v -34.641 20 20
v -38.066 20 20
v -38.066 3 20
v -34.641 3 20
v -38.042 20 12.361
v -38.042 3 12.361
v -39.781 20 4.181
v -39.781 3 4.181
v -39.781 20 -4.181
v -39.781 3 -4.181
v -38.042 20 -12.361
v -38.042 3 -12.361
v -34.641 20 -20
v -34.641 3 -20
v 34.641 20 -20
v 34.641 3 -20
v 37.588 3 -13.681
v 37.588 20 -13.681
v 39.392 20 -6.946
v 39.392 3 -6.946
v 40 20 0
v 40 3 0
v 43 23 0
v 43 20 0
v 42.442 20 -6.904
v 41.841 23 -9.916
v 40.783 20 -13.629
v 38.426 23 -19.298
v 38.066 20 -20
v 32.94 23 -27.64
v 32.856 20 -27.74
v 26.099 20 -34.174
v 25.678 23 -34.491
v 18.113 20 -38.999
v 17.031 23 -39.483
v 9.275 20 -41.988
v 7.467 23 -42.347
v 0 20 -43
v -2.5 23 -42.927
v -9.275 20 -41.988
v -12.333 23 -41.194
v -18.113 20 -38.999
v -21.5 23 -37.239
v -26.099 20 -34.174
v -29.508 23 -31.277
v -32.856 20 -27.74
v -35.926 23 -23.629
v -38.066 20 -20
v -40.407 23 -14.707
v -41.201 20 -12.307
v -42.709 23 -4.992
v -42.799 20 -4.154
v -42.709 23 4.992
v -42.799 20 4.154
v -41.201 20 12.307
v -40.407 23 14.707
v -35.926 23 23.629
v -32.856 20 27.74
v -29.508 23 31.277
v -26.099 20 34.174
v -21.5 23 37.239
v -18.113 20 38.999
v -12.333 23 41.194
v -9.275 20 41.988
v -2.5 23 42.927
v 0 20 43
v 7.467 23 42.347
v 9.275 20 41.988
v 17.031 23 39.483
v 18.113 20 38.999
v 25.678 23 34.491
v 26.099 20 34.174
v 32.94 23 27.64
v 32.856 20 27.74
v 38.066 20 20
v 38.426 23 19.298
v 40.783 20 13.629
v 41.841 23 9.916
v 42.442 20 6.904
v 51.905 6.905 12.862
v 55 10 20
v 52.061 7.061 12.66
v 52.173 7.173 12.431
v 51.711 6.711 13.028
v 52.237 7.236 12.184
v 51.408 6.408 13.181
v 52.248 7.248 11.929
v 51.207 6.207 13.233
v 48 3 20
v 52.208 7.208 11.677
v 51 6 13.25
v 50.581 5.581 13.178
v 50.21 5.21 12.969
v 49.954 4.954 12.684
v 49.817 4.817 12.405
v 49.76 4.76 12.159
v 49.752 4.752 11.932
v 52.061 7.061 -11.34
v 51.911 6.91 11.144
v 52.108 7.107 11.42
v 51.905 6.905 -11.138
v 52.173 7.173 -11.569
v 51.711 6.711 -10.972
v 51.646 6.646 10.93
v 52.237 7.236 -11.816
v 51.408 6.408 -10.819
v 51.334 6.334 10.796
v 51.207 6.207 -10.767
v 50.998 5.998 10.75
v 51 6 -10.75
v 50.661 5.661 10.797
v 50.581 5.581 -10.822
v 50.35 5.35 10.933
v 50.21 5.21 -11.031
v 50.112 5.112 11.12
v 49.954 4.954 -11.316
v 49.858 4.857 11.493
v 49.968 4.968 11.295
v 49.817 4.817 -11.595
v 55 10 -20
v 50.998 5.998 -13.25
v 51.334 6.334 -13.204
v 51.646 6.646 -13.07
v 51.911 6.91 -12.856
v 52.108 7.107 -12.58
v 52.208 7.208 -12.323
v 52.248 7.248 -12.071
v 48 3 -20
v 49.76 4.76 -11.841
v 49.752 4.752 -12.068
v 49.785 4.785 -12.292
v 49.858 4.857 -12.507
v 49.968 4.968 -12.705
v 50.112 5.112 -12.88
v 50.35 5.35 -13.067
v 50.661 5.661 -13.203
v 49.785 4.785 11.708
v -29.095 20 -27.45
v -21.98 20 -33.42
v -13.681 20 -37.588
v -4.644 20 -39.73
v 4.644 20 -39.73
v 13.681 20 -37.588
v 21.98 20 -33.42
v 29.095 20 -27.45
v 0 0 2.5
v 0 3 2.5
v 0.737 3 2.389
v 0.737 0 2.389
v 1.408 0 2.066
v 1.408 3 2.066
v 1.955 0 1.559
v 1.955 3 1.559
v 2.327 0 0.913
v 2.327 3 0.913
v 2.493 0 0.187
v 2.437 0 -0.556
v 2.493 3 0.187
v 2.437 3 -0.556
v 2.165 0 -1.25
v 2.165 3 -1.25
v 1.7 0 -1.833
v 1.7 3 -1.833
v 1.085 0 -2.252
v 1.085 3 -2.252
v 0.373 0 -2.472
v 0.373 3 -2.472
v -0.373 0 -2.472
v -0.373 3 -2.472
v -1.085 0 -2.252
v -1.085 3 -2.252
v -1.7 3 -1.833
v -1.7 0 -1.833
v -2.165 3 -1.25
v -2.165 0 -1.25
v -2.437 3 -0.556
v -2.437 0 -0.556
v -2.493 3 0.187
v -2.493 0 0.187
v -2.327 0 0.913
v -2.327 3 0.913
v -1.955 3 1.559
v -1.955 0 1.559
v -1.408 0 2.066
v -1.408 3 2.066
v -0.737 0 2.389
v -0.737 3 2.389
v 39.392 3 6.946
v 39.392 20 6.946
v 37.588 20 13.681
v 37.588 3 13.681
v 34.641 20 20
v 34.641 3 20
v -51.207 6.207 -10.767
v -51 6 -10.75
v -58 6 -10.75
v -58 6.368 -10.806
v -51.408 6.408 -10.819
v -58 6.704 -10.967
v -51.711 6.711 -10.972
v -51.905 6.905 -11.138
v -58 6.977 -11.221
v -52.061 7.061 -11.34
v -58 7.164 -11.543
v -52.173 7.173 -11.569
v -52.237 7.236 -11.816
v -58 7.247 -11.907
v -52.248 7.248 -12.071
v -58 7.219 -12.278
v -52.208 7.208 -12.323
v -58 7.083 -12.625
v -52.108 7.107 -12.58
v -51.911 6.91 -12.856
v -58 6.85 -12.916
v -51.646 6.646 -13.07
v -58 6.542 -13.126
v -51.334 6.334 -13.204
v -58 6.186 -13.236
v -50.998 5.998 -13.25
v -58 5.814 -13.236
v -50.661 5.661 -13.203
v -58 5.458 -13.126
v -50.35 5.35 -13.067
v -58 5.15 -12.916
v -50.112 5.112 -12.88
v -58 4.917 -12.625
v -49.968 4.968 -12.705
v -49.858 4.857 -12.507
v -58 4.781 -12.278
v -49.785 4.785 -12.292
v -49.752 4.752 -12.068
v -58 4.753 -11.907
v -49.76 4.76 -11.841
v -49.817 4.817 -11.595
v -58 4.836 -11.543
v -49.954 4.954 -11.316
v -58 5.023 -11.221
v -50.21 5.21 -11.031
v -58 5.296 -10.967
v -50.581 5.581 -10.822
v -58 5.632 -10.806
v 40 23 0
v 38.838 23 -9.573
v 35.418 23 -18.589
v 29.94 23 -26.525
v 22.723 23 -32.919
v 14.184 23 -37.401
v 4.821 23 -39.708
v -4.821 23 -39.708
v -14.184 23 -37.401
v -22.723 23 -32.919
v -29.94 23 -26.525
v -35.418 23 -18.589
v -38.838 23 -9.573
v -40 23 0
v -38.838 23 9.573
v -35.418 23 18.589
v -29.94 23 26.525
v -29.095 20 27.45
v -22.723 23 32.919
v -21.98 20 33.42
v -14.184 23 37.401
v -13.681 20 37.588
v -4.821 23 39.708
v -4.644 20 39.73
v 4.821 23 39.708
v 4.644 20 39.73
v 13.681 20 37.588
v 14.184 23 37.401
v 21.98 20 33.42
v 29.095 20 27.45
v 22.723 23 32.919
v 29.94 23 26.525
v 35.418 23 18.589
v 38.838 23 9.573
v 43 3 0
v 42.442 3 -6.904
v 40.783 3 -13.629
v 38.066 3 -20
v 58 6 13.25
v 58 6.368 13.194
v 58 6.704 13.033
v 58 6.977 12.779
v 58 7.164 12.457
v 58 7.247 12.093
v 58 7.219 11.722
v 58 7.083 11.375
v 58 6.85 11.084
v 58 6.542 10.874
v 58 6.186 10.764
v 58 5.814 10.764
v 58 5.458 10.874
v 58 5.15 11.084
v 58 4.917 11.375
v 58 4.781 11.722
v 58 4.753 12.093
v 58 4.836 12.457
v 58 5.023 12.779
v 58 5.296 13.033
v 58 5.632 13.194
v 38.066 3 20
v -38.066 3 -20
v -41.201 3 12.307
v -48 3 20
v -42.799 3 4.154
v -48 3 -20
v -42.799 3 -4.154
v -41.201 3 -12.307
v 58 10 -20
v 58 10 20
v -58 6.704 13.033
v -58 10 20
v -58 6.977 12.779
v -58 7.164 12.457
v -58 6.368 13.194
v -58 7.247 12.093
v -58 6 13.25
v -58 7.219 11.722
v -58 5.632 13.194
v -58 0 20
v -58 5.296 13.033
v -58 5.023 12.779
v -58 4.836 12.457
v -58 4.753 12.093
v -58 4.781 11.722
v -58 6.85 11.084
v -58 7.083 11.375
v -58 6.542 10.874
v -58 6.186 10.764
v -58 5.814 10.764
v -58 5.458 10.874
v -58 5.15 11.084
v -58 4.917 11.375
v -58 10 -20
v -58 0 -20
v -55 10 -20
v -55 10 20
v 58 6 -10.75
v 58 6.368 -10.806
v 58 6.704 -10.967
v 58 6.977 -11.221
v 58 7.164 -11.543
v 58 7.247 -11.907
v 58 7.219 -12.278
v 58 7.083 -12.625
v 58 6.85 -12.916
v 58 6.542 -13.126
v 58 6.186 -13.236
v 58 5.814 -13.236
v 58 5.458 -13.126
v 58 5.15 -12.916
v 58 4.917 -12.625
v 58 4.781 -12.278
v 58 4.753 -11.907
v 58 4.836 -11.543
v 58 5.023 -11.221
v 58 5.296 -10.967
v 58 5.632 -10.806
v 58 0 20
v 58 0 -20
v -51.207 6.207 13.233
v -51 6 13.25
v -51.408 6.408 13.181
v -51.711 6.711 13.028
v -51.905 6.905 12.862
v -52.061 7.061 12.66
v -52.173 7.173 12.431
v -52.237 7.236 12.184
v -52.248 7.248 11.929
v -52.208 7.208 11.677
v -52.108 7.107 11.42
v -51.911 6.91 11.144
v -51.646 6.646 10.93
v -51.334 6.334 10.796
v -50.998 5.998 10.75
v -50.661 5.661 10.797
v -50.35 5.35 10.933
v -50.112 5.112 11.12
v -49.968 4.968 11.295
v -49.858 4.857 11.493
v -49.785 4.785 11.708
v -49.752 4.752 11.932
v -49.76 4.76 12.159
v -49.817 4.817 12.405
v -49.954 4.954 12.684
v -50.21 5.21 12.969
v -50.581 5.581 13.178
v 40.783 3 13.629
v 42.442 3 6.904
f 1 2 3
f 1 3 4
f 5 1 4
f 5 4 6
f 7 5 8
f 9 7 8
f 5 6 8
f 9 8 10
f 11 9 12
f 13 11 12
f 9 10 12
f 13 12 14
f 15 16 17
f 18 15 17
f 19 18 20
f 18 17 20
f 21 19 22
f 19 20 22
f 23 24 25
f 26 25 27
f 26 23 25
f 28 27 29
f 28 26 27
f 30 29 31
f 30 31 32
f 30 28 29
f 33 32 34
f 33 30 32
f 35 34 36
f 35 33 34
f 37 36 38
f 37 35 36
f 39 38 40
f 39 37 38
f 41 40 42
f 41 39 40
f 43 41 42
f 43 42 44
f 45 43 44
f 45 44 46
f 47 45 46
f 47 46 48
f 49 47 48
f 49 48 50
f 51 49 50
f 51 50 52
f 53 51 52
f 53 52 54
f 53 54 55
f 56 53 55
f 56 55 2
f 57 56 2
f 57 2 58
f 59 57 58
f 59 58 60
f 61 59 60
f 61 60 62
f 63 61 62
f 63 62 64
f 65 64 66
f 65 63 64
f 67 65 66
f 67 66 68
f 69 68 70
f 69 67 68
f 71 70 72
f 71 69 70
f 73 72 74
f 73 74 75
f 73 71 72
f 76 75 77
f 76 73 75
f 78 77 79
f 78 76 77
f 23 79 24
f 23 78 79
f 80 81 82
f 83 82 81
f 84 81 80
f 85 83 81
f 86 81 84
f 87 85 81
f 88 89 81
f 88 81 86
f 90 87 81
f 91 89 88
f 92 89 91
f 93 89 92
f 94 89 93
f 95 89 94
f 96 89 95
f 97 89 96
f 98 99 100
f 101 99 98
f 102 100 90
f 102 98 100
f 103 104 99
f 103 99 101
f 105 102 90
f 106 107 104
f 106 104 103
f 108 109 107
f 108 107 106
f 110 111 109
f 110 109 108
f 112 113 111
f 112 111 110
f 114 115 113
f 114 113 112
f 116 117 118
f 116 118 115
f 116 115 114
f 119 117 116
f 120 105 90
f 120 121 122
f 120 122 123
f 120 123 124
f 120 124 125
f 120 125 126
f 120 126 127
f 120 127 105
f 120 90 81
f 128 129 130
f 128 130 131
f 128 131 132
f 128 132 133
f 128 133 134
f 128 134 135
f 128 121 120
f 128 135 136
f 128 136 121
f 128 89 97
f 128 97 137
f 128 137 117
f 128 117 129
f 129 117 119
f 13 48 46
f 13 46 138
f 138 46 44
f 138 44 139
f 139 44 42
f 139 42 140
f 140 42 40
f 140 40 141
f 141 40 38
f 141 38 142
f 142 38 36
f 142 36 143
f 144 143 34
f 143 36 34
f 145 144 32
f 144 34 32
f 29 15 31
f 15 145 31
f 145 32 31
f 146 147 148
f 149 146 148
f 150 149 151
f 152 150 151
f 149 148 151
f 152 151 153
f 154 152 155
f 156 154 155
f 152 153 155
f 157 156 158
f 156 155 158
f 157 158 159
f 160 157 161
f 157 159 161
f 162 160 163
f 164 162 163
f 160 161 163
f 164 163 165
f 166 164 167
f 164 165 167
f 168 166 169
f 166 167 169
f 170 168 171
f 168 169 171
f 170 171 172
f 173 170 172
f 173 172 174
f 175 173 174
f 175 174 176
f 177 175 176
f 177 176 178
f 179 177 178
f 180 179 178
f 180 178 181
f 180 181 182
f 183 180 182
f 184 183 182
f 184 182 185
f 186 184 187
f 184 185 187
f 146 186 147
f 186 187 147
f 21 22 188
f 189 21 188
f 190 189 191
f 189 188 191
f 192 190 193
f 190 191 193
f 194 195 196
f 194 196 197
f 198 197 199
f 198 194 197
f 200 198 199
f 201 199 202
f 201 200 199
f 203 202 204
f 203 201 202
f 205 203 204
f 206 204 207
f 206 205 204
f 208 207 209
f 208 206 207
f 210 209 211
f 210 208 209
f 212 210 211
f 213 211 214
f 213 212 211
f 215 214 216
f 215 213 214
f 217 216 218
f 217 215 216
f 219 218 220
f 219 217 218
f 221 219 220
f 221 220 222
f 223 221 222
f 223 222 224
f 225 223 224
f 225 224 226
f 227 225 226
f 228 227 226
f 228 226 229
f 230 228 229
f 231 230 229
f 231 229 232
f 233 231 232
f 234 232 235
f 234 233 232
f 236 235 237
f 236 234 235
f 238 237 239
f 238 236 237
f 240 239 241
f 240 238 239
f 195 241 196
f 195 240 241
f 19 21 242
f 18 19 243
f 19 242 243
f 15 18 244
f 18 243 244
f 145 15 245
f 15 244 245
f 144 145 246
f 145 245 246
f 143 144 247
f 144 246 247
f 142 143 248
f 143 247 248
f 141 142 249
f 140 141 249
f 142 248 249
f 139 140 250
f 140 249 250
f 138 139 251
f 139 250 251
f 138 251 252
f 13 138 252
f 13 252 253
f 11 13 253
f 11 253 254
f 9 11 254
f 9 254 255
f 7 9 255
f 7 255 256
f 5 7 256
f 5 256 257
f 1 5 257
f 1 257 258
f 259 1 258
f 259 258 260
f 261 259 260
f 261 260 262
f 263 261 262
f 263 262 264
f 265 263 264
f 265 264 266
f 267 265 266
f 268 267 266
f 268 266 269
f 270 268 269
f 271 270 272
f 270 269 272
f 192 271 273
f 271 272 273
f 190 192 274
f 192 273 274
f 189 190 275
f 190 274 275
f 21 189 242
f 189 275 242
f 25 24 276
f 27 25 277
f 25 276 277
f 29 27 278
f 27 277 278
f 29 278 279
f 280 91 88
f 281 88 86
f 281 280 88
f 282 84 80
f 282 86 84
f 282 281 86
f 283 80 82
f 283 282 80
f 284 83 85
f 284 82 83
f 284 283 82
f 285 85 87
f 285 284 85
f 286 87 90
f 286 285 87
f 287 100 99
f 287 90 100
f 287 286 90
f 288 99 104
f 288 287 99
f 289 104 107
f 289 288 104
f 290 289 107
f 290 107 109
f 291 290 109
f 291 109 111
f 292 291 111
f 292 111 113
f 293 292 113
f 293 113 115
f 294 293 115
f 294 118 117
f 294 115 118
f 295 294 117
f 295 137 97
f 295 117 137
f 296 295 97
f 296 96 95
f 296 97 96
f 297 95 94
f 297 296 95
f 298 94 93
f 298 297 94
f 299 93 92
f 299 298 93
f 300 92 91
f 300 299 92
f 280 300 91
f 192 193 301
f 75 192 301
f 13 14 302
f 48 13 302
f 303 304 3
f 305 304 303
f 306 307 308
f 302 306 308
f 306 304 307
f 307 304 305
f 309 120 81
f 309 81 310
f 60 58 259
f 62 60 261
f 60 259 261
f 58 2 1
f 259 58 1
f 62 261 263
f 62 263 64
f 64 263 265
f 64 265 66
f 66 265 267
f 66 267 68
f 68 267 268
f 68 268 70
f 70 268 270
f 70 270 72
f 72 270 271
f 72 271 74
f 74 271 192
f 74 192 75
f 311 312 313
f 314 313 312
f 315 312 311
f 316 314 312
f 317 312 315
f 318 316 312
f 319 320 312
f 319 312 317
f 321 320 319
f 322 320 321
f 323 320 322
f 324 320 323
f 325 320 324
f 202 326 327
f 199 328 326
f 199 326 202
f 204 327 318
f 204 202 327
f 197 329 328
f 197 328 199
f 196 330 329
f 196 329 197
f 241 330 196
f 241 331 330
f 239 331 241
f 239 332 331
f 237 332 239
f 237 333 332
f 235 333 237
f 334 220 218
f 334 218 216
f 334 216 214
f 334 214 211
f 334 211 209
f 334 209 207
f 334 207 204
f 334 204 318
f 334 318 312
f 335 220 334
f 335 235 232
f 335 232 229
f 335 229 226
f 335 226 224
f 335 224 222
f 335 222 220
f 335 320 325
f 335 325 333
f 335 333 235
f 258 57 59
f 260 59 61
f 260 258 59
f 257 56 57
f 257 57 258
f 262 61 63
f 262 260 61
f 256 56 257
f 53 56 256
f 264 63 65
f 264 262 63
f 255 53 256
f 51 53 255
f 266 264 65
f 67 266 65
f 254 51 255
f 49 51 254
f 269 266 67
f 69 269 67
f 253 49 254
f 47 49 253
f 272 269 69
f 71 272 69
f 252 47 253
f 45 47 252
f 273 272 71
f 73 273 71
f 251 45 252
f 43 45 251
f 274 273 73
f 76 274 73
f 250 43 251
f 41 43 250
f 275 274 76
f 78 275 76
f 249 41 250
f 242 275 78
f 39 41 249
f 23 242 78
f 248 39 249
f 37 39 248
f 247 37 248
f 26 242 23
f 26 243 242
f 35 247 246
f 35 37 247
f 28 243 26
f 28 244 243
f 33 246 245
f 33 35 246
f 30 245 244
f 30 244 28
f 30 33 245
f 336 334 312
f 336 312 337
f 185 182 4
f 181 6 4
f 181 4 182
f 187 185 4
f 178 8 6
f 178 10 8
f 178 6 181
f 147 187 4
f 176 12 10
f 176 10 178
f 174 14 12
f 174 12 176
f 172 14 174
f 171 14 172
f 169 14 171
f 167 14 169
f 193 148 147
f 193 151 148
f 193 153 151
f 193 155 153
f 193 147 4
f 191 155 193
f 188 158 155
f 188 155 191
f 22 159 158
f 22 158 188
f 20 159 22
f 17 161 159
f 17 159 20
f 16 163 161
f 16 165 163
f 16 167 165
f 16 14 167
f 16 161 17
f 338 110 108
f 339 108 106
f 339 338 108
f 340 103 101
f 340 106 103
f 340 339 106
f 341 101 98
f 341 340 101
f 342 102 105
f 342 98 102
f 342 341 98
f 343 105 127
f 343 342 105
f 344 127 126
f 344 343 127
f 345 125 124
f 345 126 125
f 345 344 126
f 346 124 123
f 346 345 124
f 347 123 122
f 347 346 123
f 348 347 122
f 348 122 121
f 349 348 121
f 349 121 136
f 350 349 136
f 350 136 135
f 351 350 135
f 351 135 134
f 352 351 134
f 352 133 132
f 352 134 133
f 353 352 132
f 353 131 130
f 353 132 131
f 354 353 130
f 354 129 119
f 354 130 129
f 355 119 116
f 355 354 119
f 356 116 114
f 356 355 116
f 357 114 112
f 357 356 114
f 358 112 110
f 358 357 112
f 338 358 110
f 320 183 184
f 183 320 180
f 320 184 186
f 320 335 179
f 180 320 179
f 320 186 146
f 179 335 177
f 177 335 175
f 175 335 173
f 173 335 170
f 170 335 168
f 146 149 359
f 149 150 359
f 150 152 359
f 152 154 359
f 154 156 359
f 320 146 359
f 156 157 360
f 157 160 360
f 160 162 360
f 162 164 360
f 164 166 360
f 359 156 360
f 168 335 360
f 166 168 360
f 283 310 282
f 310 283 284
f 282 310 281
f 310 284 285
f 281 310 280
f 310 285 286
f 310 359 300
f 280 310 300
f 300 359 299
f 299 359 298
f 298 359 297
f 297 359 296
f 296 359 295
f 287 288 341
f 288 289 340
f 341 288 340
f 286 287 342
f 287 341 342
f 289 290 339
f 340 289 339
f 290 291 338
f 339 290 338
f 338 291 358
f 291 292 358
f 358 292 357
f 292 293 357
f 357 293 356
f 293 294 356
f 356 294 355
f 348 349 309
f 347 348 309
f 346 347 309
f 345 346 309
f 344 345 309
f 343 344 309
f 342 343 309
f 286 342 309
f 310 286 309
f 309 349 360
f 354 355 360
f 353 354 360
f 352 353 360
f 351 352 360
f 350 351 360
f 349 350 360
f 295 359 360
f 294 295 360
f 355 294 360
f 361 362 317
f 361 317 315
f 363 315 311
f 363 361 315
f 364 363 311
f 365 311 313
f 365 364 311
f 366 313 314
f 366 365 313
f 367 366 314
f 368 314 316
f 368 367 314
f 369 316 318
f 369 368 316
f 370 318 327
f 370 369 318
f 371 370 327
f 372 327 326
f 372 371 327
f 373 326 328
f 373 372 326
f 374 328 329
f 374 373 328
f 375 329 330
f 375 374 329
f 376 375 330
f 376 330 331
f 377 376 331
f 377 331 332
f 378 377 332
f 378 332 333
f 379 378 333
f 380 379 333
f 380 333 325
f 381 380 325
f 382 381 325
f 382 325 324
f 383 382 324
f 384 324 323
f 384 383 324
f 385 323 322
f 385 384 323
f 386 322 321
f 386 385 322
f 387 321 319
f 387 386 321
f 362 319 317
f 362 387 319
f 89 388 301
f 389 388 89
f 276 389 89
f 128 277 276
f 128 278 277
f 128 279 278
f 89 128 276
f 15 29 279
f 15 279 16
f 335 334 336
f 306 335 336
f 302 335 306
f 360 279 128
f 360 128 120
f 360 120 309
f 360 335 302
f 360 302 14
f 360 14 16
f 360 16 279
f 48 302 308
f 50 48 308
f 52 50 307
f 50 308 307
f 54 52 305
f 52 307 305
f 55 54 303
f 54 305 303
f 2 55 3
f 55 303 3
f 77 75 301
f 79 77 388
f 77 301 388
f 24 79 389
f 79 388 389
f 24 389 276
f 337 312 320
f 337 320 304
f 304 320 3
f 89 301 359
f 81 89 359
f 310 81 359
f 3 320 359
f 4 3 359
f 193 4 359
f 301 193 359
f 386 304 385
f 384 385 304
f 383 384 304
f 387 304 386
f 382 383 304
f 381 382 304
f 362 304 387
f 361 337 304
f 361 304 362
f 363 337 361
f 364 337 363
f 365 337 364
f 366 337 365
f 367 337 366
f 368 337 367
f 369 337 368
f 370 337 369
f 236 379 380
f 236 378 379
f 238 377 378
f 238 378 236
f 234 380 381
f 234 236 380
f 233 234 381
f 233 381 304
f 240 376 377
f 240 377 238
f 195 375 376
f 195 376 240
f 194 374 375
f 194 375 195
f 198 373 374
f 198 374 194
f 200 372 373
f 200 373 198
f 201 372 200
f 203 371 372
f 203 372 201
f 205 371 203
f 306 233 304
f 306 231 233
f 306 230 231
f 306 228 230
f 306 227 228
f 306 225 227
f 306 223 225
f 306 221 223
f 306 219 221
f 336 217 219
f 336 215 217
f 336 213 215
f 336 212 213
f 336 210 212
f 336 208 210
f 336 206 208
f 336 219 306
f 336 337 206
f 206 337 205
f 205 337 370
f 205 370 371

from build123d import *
from build123d.topology import SkipClean

# Parameters (mm, degrees)
SKETCH_1_W               = 116
SKETCH_1_H               = 40
EXTRUDE_1_DEPTH          = 3
SKETCH_2_R               = 2.5
CUT_EXTRUDE_1_DEPTH      = 3
SKETCH_3_W               = 3
SKETCH_3_H               = 40
EXTRUDE_2_DEPTH          = 7
CHAMFER_1_SIZE           = 7
CUT_EXTRUDE_2_DEPTH      = 119.135515405
CUT_EXTRUDE_2_DEPTH_BACK = 119.135515405
SKETCH_4_R               = 1.25
SKETCH_6_R               = 43
SKETCH_6_R_2             = 40
EXTRUDE_1_2_DEPTH        = 3
EXTRUDE_3_DEPTH          = 17


with BuildPart() as part:
    # 草图1 → Extrude 1 (new body)
    with BuildSketch(Plane(origin=(0, 0, 0), x_dir=(1, 0, 0), z_dir=(0, 1, 0))):
        Rectangle(SKETCH_1_W, SKETCH_1_H)
    extrude(amount=EXTRUDE_1_DEPTH)

    # 草图2 → 切除-拉伸1 (cut)
    with BuildSketch(Plane(origin=(0, 3, 0), x_dir=(1, 0, 0), z_dir=(0, 1, 0))):
        with Locations(Location((0, 0, 0), (0, 0, 270))):
            Circle(SKETCH_2_R)
    extrude(amount=-CUT_EXTRUDE_1_DEPTH, mode=Mode.SUBTRACT)

    # 草图3 → 凸台-拉伸2 (add)
    with BuildSketch(Plane(origin=(0, 3, 0), x_dir=(1, 0, 0), z_dir=(0, 1, 0))):
        with Locations((-56.5, 0)):
            Rectangle(SKETCH_3_W, SKETCH_3_H)
        with Locations((56.5, 0)):
            Rectangle(SKETCH_3_W, SKETCH_3_H)
    extrude(amount=EXTRUDE_2_DEPTH)

    # 倒角1
    chamfer_1_edges = [part.edges().sort_by_distance(p)[0] for p in [
        (-55, 3, 0),
        (55, 3, 0),
    ]]
    chamfer(chamfer_1_edges, length=CHAMFER_1_SIZE - 0.0001)  # a hair under: the kernel refuses the full size

    # 草图4 → 切除-拉伸2 (cut, two sides: drawn at the far end of the back side and taken through both)
    with BuildSketch(Plane.ZY.offset(58).offset(-CUT_EXTRUDE_2_DEPTH_BACK)):
        with Locations((-12, 6)):
            Circle(SKETCH_4_R)
        with Locations((12, 6)):
            Circle(SKETCH_4_R)
    extrude(amount=CUT_EXTRUDE_2_DEPTH + CUT_EXTRUDE_2_DEPTH_BACK, mode=Mode.SUBTRACT)



with BuildPart() as body_2:
    # 草图6 → Extrude 1 2 (new body)
    with BuildSketch(Plane(origin=(0, 23, 0), x_dir=(1, 0, 0), z_dir=(0, 1, 0))):
        Circle(SKETCH_6_R)
        Circle(SKETCH_6_R_2, mode=Mode.SUBTRACT)
    extrude(amount=-EXTRUDE_1_2_DEPTH)


with BuildPart() as part_1:
    with SkipClean():  # the faces are left unmerged after this step: merging them gives an invalid solid
        add(part.part)

        add(body_2.part)  # 凸台-拉伸3 merges body 2
        # 草图7 → 凸台-拉伸3 (add)
        with BuildSketch(Plane(origin=(0, 3, 0), x_dir=(1, 0, 0), z_dir=(0, 1, 0))):
            with BuildLine():
                Line((-34.641016151, 20), (-38.065732621, 20))
                ThreePointArc((-38.065732621, 20), (-43, 0), (-38.065732621, -20))
                Line((-38.065732621, -20), (-34.641016151, -20))
                ThreePointArc((-34.641016151, -20), (-40, 0), (-34.641016151, 20))
            make_face()
            with BuildLine():
                ThreePointArc((43, 0), (41.748212553, 10.299842166), (38.065732621, 20))
                Line((38.065732621, 20), (34.641016151, 20))
                ThreePointArc((34.641016151, 20), (38.637033052, 10.352761804), (40, 0))
                ThreePointArc((40, 0), (38.637033052, -10.352761804), (34.641016151, -20))
                Line((34.641016151, -20), (38.065732621, -20))
                ThreePointArc((38.065732621, -20), (41.748212553, -10.299842166), (43, 0))
            make_face()
        extrude(amount=EXTRUDE_3_DEPTH)


solid = part_1.part
